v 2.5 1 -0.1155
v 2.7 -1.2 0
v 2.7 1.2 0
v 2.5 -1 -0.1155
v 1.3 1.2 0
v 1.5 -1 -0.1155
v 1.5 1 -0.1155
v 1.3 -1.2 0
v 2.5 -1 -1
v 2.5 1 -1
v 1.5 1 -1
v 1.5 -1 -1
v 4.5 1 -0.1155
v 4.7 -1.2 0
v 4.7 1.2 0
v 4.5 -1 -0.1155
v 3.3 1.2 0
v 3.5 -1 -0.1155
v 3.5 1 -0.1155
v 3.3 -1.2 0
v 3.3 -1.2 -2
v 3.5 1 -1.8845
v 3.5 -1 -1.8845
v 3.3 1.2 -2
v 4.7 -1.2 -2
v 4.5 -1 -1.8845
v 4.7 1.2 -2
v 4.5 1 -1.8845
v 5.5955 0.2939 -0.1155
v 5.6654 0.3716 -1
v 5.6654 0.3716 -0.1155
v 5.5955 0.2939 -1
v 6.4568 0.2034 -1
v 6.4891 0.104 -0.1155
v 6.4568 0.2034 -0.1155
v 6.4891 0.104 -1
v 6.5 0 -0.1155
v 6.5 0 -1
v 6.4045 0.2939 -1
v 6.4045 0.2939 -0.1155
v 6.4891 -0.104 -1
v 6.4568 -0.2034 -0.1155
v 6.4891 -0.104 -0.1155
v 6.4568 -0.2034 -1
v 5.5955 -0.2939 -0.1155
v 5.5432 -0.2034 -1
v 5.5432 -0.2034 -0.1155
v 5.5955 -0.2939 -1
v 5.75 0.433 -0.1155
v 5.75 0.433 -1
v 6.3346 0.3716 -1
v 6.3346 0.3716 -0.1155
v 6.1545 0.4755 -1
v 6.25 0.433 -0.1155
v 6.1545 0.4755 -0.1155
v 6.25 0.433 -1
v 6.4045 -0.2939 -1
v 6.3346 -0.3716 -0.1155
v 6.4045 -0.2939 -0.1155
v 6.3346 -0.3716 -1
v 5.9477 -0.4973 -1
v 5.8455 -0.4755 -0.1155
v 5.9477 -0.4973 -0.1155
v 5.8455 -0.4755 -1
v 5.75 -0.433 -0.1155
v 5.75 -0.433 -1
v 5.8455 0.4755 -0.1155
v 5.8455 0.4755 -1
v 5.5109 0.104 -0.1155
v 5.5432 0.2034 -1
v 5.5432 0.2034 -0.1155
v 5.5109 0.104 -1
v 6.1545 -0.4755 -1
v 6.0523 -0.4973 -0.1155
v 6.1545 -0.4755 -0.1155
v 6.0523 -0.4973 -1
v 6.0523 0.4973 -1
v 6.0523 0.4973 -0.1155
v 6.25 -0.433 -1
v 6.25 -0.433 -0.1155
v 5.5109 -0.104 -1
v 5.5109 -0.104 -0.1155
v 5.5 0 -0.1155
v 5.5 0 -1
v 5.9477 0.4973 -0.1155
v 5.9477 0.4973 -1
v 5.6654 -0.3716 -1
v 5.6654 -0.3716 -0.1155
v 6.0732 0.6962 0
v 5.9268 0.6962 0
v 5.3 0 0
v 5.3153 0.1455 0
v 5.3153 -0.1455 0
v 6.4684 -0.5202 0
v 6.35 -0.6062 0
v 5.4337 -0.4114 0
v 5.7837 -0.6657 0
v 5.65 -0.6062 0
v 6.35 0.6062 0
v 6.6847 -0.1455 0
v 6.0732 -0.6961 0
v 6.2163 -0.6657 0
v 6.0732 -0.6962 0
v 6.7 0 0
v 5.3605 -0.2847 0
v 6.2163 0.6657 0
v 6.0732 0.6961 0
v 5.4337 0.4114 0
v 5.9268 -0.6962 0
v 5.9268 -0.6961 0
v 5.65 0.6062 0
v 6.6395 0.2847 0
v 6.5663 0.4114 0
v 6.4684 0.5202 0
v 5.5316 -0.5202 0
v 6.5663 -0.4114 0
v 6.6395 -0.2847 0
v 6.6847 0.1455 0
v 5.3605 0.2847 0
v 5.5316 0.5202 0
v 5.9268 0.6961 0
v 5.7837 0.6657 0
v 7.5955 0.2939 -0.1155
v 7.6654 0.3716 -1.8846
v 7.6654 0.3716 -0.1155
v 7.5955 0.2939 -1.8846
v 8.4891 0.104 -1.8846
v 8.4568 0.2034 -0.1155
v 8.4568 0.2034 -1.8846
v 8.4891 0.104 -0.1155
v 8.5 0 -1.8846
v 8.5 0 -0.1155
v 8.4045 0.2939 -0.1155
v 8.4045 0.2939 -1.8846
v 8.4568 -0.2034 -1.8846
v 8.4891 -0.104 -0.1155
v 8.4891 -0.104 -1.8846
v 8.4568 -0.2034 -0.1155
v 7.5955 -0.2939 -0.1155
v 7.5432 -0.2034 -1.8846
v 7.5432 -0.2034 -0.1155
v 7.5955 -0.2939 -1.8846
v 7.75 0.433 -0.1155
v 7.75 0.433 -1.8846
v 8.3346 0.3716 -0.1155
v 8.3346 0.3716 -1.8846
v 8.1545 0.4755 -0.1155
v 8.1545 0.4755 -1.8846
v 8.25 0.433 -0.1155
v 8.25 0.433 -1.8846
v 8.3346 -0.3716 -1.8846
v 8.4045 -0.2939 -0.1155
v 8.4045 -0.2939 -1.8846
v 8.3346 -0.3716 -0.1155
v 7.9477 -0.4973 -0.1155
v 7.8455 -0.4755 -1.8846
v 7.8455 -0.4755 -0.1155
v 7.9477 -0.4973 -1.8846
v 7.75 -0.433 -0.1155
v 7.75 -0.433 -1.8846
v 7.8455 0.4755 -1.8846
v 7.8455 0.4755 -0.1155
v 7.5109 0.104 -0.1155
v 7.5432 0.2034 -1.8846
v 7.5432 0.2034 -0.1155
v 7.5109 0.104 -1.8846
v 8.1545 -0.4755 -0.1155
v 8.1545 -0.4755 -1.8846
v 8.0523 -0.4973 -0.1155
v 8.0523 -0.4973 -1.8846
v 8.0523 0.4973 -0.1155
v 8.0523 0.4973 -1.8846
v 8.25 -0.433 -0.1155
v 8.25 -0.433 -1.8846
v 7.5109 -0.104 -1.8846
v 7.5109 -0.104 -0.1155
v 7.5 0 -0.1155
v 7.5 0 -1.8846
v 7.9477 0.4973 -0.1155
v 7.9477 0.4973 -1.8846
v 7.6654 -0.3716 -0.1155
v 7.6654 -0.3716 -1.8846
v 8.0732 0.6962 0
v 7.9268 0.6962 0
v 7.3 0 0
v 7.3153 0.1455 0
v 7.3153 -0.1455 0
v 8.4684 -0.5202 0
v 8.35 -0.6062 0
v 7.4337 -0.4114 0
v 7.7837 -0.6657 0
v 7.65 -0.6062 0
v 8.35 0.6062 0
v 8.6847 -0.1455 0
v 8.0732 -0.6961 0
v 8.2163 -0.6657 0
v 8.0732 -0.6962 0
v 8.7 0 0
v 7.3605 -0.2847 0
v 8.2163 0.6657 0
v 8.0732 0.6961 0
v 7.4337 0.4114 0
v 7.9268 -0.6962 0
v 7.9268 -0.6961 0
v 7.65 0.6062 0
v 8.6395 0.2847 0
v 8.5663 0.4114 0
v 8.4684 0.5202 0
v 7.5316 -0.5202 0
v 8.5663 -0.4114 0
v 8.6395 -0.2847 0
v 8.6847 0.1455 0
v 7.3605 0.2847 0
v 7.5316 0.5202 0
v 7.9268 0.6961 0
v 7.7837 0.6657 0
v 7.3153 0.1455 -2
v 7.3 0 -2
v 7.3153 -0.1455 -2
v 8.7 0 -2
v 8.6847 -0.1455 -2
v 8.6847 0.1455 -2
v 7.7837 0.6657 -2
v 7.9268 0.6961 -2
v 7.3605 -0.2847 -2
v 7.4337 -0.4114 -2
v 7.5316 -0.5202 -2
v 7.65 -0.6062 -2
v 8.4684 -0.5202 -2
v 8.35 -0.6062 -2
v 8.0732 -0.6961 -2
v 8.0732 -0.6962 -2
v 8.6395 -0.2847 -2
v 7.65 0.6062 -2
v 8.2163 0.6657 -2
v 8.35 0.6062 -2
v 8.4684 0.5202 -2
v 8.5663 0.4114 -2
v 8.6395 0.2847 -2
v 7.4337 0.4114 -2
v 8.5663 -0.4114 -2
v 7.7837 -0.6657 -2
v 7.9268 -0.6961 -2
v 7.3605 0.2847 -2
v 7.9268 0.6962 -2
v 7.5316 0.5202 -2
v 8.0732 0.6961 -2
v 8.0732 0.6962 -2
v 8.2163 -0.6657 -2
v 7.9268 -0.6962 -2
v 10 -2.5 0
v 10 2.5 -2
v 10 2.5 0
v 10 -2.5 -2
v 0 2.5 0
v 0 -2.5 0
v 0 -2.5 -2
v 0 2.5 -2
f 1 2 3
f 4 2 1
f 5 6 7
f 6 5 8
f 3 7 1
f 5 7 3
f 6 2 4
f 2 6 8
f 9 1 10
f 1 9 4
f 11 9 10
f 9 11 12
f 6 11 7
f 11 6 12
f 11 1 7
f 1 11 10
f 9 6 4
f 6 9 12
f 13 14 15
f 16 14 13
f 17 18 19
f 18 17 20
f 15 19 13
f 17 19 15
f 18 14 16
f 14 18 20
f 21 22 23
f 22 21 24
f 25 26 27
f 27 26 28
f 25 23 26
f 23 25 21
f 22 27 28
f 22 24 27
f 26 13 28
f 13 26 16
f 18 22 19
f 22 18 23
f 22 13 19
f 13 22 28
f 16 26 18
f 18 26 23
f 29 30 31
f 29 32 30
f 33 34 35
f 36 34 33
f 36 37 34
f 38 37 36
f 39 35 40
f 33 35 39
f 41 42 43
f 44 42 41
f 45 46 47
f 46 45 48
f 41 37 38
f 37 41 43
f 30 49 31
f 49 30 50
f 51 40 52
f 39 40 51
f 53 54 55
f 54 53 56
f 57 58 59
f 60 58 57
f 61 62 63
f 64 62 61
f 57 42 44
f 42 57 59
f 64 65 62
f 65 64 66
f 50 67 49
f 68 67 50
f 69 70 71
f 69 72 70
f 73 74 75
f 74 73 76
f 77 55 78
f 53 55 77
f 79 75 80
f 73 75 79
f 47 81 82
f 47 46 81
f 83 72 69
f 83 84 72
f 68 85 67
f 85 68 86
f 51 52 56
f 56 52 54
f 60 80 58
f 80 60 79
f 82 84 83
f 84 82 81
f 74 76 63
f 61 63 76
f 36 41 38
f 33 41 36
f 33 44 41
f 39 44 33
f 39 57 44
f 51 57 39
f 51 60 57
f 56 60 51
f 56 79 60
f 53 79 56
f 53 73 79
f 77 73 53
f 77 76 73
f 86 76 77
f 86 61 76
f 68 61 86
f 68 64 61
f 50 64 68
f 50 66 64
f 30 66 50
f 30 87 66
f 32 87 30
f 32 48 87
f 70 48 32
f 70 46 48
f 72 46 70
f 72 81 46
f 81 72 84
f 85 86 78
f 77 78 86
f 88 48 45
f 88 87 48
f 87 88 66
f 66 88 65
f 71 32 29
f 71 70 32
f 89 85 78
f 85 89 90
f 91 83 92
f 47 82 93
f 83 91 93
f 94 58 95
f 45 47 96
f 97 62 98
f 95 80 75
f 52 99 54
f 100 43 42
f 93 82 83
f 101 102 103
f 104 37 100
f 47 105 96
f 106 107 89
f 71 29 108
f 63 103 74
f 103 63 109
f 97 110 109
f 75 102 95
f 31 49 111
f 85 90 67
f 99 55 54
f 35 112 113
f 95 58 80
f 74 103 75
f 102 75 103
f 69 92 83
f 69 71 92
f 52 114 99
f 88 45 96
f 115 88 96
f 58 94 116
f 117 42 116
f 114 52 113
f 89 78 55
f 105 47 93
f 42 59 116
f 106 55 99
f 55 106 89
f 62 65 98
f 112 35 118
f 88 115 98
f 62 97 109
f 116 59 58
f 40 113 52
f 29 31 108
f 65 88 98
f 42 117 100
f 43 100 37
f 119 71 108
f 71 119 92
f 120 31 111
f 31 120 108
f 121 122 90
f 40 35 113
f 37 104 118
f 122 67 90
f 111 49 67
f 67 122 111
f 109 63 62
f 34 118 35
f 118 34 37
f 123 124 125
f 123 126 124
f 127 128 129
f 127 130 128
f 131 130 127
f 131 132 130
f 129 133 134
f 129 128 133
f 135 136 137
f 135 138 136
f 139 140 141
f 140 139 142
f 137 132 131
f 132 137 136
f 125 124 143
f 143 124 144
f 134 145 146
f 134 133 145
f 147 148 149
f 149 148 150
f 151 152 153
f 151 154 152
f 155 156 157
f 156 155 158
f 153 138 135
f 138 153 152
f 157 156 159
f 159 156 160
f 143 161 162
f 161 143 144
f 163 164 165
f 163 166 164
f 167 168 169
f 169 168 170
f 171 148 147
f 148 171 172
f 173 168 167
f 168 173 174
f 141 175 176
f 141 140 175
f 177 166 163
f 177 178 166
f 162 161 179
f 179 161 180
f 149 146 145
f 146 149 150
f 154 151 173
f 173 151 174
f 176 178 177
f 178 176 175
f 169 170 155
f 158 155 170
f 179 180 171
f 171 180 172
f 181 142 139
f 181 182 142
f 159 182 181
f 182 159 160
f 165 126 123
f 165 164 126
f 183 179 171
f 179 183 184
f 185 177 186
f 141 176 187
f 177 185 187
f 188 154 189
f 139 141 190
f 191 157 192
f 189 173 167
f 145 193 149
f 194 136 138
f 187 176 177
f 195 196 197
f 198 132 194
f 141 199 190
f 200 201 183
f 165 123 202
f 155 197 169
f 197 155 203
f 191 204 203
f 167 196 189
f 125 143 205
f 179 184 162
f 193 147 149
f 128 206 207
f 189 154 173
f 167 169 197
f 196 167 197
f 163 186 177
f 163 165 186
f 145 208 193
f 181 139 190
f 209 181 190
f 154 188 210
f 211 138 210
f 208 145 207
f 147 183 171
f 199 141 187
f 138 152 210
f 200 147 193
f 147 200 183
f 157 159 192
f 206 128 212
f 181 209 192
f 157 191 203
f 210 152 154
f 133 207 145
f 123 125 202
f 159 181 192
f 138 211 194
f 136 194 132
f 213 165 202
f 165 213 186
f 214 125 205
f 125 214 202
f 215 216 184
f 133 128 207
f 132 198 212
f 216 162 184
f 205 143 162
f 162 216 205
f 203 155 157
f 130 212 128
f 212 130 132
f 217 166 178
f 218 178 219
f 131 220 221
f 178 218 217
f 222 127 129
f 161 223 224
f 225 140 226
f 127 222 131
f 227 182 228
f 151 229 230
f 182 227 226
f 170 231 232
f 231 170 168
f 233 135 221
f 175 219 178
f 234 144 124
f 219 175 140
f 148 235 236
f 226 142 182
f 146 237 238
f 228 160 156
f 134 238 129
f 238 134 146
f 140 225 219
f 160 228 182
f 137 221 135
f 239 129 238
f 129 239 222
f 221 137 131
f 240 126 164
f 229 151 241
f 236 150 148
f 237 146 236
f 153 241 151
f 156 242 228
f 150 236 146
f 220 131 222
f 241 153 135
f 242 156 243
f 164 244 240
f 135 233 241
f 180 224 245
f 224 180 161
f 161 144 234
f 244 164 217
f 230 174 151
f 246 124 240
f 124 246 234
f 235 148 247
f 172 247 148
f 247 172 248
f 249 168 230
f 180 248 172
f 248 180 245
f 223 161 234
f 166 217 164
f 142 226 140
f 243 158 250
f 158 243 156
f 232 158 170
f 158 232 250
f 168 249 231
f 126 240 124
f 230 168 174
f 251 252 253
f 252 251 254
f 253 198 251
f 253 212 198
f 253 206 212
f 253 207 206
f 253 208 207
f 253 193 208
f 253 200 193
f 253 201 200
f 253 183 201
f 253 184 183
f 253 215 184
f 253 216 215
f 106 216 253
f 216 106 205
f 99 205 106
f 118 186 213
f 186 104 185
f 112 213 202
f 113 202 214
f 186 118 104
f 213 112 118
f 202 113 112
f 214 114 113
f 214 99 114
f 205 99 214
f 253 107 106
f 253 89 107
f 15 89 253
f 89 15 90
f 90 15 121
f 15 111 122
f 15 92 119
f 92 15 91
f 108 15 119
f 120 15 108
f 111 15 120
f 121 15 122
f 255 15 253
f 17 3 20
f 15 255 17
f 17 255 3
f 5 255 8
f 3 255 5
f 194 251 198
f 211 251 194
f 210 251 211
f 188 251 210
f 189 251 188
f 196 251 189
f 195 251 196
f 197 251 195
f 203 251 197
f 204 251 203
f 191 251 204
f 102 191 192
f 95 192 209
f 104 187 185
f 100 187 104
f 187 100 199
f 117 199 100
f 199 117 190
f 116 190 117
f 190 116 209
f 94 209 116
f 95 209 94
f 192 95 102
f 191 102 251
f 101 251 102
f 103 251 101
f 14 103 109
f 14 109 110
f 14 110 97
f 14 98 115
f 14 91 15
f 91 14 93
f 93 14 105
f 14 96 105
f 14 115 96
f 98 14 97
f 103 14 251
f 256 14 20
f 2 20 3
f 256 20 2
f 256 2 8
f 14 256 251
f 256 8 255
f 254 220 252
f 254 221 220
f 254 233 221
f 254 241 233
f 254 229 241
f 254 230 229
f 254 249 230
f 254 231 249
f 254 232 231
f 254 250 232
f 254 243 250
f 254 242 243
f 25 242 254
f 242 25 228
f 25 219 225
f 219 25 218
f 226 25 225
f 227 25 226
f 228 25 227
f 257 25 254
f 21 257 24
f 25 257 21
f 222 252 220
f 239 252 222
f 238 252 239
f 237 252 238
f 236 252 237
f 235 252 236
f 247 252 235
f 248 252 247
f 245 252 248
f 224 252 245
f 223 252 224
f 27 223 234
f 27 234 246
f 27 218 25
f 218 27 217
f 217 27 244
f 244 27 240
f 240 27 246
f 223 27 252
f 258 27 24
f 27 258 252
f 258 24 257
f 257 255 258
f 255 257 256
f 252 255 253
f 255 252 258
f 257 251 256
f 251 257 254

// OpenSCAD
// file: ../../utility/angle/distance_of_angle_range.scad
/// 角度範囲の距離 [deg] を取得
/// @param normalize true: +/-何れの回転方向でも1回転分以内に正規化, false: 多回転する場合もそのまま
function distance_of_angle_range( range = [ 0 : 360 ], normalize = true ) = 
  let
  ( d = range[ 2 ] - range[ 0 ]
  )
    normalize
      ? ( d % 360 )
      : d
  ;
// file: ../../utility/vector/slice_vector.scad
/// vector の部分 vector を取得
/// @param begin 取得したい部分 vector の先頭位置
/// @param end   取得したい部分 vector の終端位置
/// @param internal_buffer 内部バッファー ( 明示的に引数として与える必要はありません )
function slice_vector( v, begin = 0, end = 0, internal_buffer = [ ] ) = 
  let( end = end > begin ? end : begin )
    begin == end
      ? internal_buffer
      : concat( [ v[ begin ] ], slice_vector( v, begin + 1, end, internal_buffer ) )
  ;
// file: ../../utility/angle/angle_step.scad
include <distance_of_angle_range.scad>

/// OpenSCAD の circle と同様のアルゴリズムにより $fn, $fa, $fs から角度範囲のステップ角度[deg]を取得
function angle_step( radius, range = [ 0 : 360 ] ) = 
  let( drange = distance_of_angle_range( range ) )
    drange
      / ( $fn > 0
            ? ( $fn >= 3 ? $fn : 3)
            : ceil
              ( max
                ( min
                  ( drange / $fa
                  , radius * 2 * PI * drange / 360 / $fs
                  )
                , 5
                )
              )
        )
  ;

/// $fn のみから角度範囲のステップ角度を取得
function angle_step_fn( range = [ 0 : 360 ] ) = distance_of_range( range ) / $fn;

/// $fs のみから角度範囲のステップ角度を取得
function angle_step_fs( radius = 1, range = [ 0 : 360 ] ) = distance_of_range( range ) / asin( $fs / radius );
// file: ../../utility/vector/pop_vector_block.scad
include <slice_vector.scad>

/// vector の末尾要素から length 個の要素を並び順のまま取得
function pop_vector_block( v, length = 0 ) = 
  let( end = len( v ) )
    slice_vector( v, end - length, end )
  ;
// file: ../../coordinate/to_cartesian_from_polar.scad
/// カルテシアン座標をポーラー座標から取得
/// @param radius 半径
/// @param angle 角度
/// @note angle=0のときX軸方向に一致、Y軸回転、右ねじ
function to_cartesian_from_polar( radius, angle ) = [ cos( angle ) * radius, -sin( angle ) * radius ];
// file: ../../utility/angle/make_angle_range.scad
include <angle_step.scad>

/// 角度範囲を生成
/// @note 弧のポリゴン分割は OpenSCAD 内蔵の circle と同様に $fn, $fa, $fs から誘導されます。
function make_angle_range( radius, first, last ) = [ first : angle_step( radius, [ first : last ] ) : last ];
/// @note 弧のポリゴン分割は $fn のみから誘導されます。分割数を一定にしたい場合に使用します。
function make_angle_range_fn( first, last ) = [ first : angle_step_fn( [ first : last ] ) : last ];
/// @note 弧のポリゴン分割は $fa のみから誘導されます。分割角度を一定にしたい場合に使用します。
function make_angle_range_fa( first, last ) = [ first : $fa : last ];
/// @note 弧のポリゴン分割は $fs のみから誘導されます。表面の細分割品質を一定にしたい場合に使用します。
function make_angle_range_fs( rasius, first, last ) = [ first : angle_step_fs( radius, [ first : last ] ) : last ];
// file: ../../utility/vector/translate_vector.scad
include <pop_vector_block.scad>

function translate_vector( translation, v, internal_buffer = [ ] ) = 
  len( v ) == 0
    ? internal_buffer
    : translate_vector( translation, pop_vector_block( v, len( v ) - 1 ), concat( internal_buffer, [ v[ 0 ] + translation ] )  )
  ;
// file: ../../geometry/generate_arc_vertices.scad
include <../utility/angle/make_angle_range.scad>
include <../coordinate/to_cartesian_from_polar.scad>

/// 弧の頂点群を生成
/// @param radius 弧の半径
/// @param angle_first 
/// @note 弧のポリゴン分割は OpenSCAD 内蔵の circle と同様に $fn, $fa, $fs から誘導されます。
function generate_arc_vertices( radius, angle_first, angle_last ) =
  generate_arc_vertices_range
  ( radius
  , make_angle_range( radius, angle_first, angle_last )
  );

/// 弧の頂点群を生成
/// @param radius 弧の半径
/// @param angle_first 
/// @note 弧のポリゴン分割は $fn のみから誘導されます。分割数を一定にしたい場合に使用します。
function generate_arc_vertices_fn( radius, angle_first, angle_last ) =
  generate_arc_vertices_range
  ( radius
  , make_angle_range_fn( angle_first, angle_last )
  );

/// 弧の頂点群を生成
/// @param radius 弧の半径
/// @param angle_first 
/// @note 弧のポリゴン分割は $fa のみから誘導されます。分割角度を一定にしたい場合に使用します。
function generate_arc_vertices_fa( radius, angle_first, angle_last ) =
  generate_arc_vertices_range
  ( radius
  , make_angle_range_fa( angle_first, angle_last )
  );

/// 弧の頂点群を生成
/// @param radius 弧の半径
/// @param angle_first 
/// @note 弧のポリゴン分割は $fs のみから誘導されます。表面の細分割品質を一定にしたい場合に使用します。
function generate_arc_vertices_fs( radius, angle_first, angle_last ) =
  generate_arc_vertices_range
  ( radius
  , make_angle_range_fs( radius, angle_first, angle_last )
  );

/// 弧の頂点群を生成
/// @param radius 弧の半径
/// @param range 弧の角度範囲(Y軸回転, 0 [deg] = X軸方向, +向き=右ねじ回転方向)
///                [ first : step : last ]
///                step に $fn, $fa, $fs から誘導される値を使用したい場合は generage_arc_vertices 関数を使用して下さい。
// --- 再帰構築用内部使用パラメーター(ユーザーは明示的に扱う必要の無いパラメーターです) ---
/// @param internal_angle 再帰構築用内部角度値
/// @param internal_buffer 再帰構築用内部バッファー
function generate_arc_vertices_range( radius, angle_range, internal_angle = [ ], internal_buffer = [ ] ) =
  let( internal_angle = internal_angle == [ ] ? angle_range[ 0 ] : internal_angle )
    internal_angle > angle_range[ 2 ]
      ? concat( internal_buffer, [ to_cartesian_from_polar( radius, angle_range[ 2 ] ) ] )
      : generate_arc_vertices_range
        ( radius
        , angle_range
        , internal_angle + angle_range[ 1 ]
        , concat( internal_buffer, [ to_cartesian_from_polar( radius, internal_angle ) ] )
        )
  ;
// file: ../../part/pipe.scad
include <../geometry/chamfered_square.scad>

/// パイプ(=中空の丸棒部品)を内径と外径と長さから造形
/// @param inner_diameter 内径 [mm]
/// @param outer_diameter 外径 [mm]
/// @param length 長さ [mm]
// --- optional ---
/// @param chamfering_type 面取りタイプ (default="C")
///                          "C": 平面 (chamfering_angle,chamfering_lengthと合わせて使う)
///                          "R": 曲面 (chamfering_lengthが半径指定に変わります)
/// @param chamfering_angle 面取り角度(Y軸からX軸方向への開き角度) [deg]
/// @param chamfering_length 面取り長さ(Y軸食い込み長さ) [mm]
// --- optional for more details ---
/// @param inner_chamfering_angle 内径側の面取り角度(内径側と外径側で同じ設定を採用する場合は chamfering_angle のみ設定すればよい)
/// @param inner_chamfering_length 内径側の面取り長さ(内径側と外径側で同じ設定を採用する場合は chamfering_length のみ設定すればよい)
/// @param outer_chamfering_angle 外径側の面取り角度(内径側と外径側で同じ設定を採用する場合は chamfering_angle のみ設定すればよい)
/// @param outer_chamfering_length 外径側の面取り長さ(内径側と外径側で同じ設定を採用する場合は chamfering_length のみ設定すればよい)
module pipe
( inner_diameter
, outer_diameter
, length

// --- optional detail level-2 ( highest )
, chamfering_angle  = 45
, chamfering_length = 0
, chamfering_type   = "C"

// --- optional for detail level-1
, inner_chamfering_angle = [ ]
, outer_chamfering_angle = [ ]

, inner_chamfering_length  = [ ]
, outer_chamfering_length  = [ ]

, inner_chamfering_type  = [ ]
, outer_chamfering_type  = [ ]

// --- optional for detail level-0 ( lowest )
, inner_bottom_chamfering_angle = [ ]
, inner_top_chamfering_angle    = [ ]
, outer_bottom_chamfering_angle = [ ]
, outer_top_chamfering_angle    = [ ]

, inner_bottom_chamfering_length  = [ ]
, inner_top_chamfering_length     = [ ]
, outer_bottom_chamfering_length  = [ ]
, outer_top_chamfering_length     = [ ]

, inner_bottom_chamfering_type  = [ ]
, inner_top_chamfering_type     = [ ]
, outer_bottom_chamfering_type  = [ ]
, outer_top_chamfering_type     = [ ]

, chamfering_parameters = [ ]

, center = false
)
{
  let
  ( chamfering_angle  = chamfering_parameters != [ ] ? chamfering_parameters[ 0 ] : chamfering_angle
  , chamfering_length = chamfering_parameters != [ ] ? chamfering_parameters[ 1 ] : chamfering_length
  , chamfering_type   = chamfering_parameters != [ ] ? chamfering_parameters[ 2 ] : chamfering_type
  )
  translate( [ 0, 0, center ? -length / 2 : 0 ] )
  rotate_extrude()
  translate( [ inner_diameter / 2, 0, 0 ] )
    chamfered_square
    ( [ ( outer_diameter - inner_diameter ) / 2
      , length
      ]
    
    // ここから面取りパラメーターの単純転送
    , chamfering_angle = chamfering_angle
    , chamfering_length = chamfering_length
    , chamfering_type = chamfering_type

    , inner_chamfering_angle = inner_chamfering_angle
    , outer_chamfering_angle = outer_chamfering_angle

    , inner_chamfering_length = inner_chamfering_length
    , outer_chamfering_length = outer_chamfering_length

    , inner_chamfering_type = inner_chamfering_type
    , outer_chamfering_type = outer_chamfering_type

    , inner_bottom_chamfering_angle = inner_bottom_chamfering_angle
    , inner_top_chamfering_angle =inner_top_chamfering_angle
    , outer_bottom_chamfering_angle = outer_bottom_chamfering_angle
    , outer_top_chamfering_angle = outer_top_chamfering_angle

    , inner_bottom_chamfering_length = inner_bottom_chamfering_length
    , inner_top_chamfering_length = inner_top_chamfering_length
    , outer_bottom_chamfering_length = outer_bottom_chamfering_length
    , outer_top_chamfering_length = outer_top_chamfering_length

    , inner_bottom_chamfering_type= inner_bottom_chamfering_type
    , inner_top_chamfering_type = inner_top_chamfering_type
    , outer_bottom_chamfering_type = outer_bottom_chamfering_type
    , outer_top_chamfering_type = outer_top_chamfering_type
    )
  ;
}
// file: ../../part/shaft.scad
include <pipe.scad>

module shaft
( diameter
, length
// --- optional detail level-1 ( highest )
, chamfering_angle  = 45
, chamfering_length = 0
, chamfering_type   = "C"

// --- optional for detail level-0 ( lowest )
, top_chamfering_angle      = [ ]
, bottom_chamfering_angle   = [ ]
, top_chamfering_length     = [ ]
, bottom_chamfering_length  = [ ]
, top_chamfering_type       = [ ]
, bottom_chamfering_type    = [ ]

, chamfering_parameters = [ ]

, center = false
)
{
  let
 (  chamfering_angle  = chamfering_parameters != [ ] ? chamfering_parameters[ 0 ] : chamfering_angle
  , chamfering_length = chamfering_parameters != [ ] ? chamfering_parameters[ 1 ] : chamfering_length
  , chamfering_type   = chamfering_parameters != [ ] ? chamfering_parameters[ 2 ] : chamfering_type

  , top_chamfering_angle      = top_chamfering_angle      >  0   ? top_chamfering_angle      : chamfering_angle
  , top_chamfering_length     = top_chamfering_length     >  0   ? top_chamfering_length     : chamfering_length
  , top_chamfering_type       = top_chamfering_type       != [ ] ? top_chamfering_type       : chamfering_type
  , bottom_chamfering_angle   = bottom_chamfering_angle   >  0   ? bottom_chamfering_angle   : chamfering_angle
  , bottom_chamfering_length  = bottom_chamfering_length  >  0   ? bottom_chamfering_length  : chamfering_length
  , bottom_chamfering_type    = bottom_chamfering_type    != [ ] ? bottom_chamfering_type    : chamfering_type
  )
    pipe
    ( 0
    , diameter
    , length

    , inner_top_chamfering_angle      = 0
    , inner_top_chamfering_length     = 0
    , inner_top_chamfering_type       = [ ]
    , inner_bottom_chamfering_angle   = 0
    , inner_bottom_chamfering_length  = 0
    , inner_bottom_chamfering_type    = [ ]

    , outer_top_chamfering_angle      = top_chamfering_angle
    , outer_top_chamfering_length     = top_chamfering_length
    , outer_top_chamfering_type       = top_chamfering_type
    , outer_bottom_chamfering_angle   = bottom_chamfering_angle
    , outer_bottom_chamfering_length  = bottom_chamfering_length
    , outer_bottom_chamfering_type    = bottom_chamfering_type

    , center = center
    );
}
// file: ../../geometry/chamfered_hole.scad
include <chamfered_cube.scad>
include <../part/shaft.scad>

/// @param hole_size 穴の大きさ
///                    hole_type == "cube"    : [ X, Y, Z ]
///                    hole_type == "cylinder": [ Diameter, Height ]
/// @param hole_type 穴の形状 "cube" | "cylinder" | "screw"
/// @aperrural_angle 穴からの面取り部分の開口角度(穴の中心から左右両方へ併せて180°までのうち、どれだけ開くか。片側だけみて30°なら両側で60°として与えます)
module chamfered_hole
( hole_size
, hole_type = "cube"
, apertural_angle   = 120
, apertural_length  = 0
, piercing = false
, center = false
)
{
  if ( hole_type == "cube" )
    translate
    ( [ center ? -hole_size[ 0 ] / 2 : 0
      , center ? -hole_size[ 1 ] / 2 : 0
      , 0
      ]
    )
    {
      translate( [ 0, 0, -hole_size[ 2 ] ] )
        cube( hole_size );
      
      ah = apertural_angle / 2;
      dy = apertural_length / tan( ah );
      dh = apertural_length * 2;
      s = [ hole_size[ 0 ] + dh, hole_size[ 1 ] + dh, dy * 2 ];
      cp = [ ah, dy, "C" ];

      translate( [ -apertural_length, -apertural_length, -dy ] )
        chamfered_cube( s, bottom_chamfering_parameters = cp );

      if ( piercing )
        translate( [ -apertural_length, -apertural_length, -hole_size[ 2 ] - dy ] )
          chamfered_cube( s, top_chamfering_parameters = cp );
    }
  else if ( hole_type == "cylinder" )
  {
    translate( [ 0, 0, -hole_size[ 1 ] ] )
      cylinder( d = hole_size[ 0 ], h = hole_size[ 1 ] );

    ah = apertural_angle / 2;
    dy = apertural_length / tan( ah );
    dd = apertural_length * 2;
    
    cp = [ ah, dy, "C" ];

    translate( [ 0, 0, -dy ] )
      shaft( hole_size[ 0 ] + dd, dy * 2, chamfering_parameters = cp );        
    
    if ( piercing )
      translate( [ 0, 0, -hole_size[ 1 ] - dy ] )
        shaft( hole_size[ 0 ] + dd, dy * 2, chamfering_parameters = cp );
  }
}
// main file
include <../../geometry/chamfered_hole.scad>

$fs = 0.1;

difference()
{
  // 穴を開けたい対象
  translate( [ 0, -2.5, -2 ] )
    cube( [ 10, 5, 2 ] );

  // 立方体で開口部の面取り付きの穴(不貫通)
  translate( [ 2, 0, 0 ] )
    chamfered_hole( hole_size = [ 1, 2, 1 ], hole_type = "cube", apertural_angle = 120, apertural_length = 0.2, center = true );

  // 立方体で開口部の面取り付きの穴(貫通)
  translate( [ 4, 0, 0 ] )
    chamfered_hole( hole_size = [ 1, 2, 2 ], hole_type = "cube", apertural_angle = 120, apertural_length = 0.2, center = true, piercing = true );

  // 円筒形で開口部の面取り付きの穴(不貫通)
  translate( [ 6, 0, 0 ] )
    chamfered_hole( hole_size = [ 1, 1 ], hole_type = "cylinder", apertural_angle = 120, apertural_length = 0.2, center = true );

  // 円筒形で開口部の面取り付きの穴(貫通)
  translate( [ 8, 0, 0 ] )
    chamfered_hole( hole_size = [ 1, 2 ], hole_type = "cylinder", apertural_angle = 120, apertural_length = 0.2, center = true, piercing = true );

}
